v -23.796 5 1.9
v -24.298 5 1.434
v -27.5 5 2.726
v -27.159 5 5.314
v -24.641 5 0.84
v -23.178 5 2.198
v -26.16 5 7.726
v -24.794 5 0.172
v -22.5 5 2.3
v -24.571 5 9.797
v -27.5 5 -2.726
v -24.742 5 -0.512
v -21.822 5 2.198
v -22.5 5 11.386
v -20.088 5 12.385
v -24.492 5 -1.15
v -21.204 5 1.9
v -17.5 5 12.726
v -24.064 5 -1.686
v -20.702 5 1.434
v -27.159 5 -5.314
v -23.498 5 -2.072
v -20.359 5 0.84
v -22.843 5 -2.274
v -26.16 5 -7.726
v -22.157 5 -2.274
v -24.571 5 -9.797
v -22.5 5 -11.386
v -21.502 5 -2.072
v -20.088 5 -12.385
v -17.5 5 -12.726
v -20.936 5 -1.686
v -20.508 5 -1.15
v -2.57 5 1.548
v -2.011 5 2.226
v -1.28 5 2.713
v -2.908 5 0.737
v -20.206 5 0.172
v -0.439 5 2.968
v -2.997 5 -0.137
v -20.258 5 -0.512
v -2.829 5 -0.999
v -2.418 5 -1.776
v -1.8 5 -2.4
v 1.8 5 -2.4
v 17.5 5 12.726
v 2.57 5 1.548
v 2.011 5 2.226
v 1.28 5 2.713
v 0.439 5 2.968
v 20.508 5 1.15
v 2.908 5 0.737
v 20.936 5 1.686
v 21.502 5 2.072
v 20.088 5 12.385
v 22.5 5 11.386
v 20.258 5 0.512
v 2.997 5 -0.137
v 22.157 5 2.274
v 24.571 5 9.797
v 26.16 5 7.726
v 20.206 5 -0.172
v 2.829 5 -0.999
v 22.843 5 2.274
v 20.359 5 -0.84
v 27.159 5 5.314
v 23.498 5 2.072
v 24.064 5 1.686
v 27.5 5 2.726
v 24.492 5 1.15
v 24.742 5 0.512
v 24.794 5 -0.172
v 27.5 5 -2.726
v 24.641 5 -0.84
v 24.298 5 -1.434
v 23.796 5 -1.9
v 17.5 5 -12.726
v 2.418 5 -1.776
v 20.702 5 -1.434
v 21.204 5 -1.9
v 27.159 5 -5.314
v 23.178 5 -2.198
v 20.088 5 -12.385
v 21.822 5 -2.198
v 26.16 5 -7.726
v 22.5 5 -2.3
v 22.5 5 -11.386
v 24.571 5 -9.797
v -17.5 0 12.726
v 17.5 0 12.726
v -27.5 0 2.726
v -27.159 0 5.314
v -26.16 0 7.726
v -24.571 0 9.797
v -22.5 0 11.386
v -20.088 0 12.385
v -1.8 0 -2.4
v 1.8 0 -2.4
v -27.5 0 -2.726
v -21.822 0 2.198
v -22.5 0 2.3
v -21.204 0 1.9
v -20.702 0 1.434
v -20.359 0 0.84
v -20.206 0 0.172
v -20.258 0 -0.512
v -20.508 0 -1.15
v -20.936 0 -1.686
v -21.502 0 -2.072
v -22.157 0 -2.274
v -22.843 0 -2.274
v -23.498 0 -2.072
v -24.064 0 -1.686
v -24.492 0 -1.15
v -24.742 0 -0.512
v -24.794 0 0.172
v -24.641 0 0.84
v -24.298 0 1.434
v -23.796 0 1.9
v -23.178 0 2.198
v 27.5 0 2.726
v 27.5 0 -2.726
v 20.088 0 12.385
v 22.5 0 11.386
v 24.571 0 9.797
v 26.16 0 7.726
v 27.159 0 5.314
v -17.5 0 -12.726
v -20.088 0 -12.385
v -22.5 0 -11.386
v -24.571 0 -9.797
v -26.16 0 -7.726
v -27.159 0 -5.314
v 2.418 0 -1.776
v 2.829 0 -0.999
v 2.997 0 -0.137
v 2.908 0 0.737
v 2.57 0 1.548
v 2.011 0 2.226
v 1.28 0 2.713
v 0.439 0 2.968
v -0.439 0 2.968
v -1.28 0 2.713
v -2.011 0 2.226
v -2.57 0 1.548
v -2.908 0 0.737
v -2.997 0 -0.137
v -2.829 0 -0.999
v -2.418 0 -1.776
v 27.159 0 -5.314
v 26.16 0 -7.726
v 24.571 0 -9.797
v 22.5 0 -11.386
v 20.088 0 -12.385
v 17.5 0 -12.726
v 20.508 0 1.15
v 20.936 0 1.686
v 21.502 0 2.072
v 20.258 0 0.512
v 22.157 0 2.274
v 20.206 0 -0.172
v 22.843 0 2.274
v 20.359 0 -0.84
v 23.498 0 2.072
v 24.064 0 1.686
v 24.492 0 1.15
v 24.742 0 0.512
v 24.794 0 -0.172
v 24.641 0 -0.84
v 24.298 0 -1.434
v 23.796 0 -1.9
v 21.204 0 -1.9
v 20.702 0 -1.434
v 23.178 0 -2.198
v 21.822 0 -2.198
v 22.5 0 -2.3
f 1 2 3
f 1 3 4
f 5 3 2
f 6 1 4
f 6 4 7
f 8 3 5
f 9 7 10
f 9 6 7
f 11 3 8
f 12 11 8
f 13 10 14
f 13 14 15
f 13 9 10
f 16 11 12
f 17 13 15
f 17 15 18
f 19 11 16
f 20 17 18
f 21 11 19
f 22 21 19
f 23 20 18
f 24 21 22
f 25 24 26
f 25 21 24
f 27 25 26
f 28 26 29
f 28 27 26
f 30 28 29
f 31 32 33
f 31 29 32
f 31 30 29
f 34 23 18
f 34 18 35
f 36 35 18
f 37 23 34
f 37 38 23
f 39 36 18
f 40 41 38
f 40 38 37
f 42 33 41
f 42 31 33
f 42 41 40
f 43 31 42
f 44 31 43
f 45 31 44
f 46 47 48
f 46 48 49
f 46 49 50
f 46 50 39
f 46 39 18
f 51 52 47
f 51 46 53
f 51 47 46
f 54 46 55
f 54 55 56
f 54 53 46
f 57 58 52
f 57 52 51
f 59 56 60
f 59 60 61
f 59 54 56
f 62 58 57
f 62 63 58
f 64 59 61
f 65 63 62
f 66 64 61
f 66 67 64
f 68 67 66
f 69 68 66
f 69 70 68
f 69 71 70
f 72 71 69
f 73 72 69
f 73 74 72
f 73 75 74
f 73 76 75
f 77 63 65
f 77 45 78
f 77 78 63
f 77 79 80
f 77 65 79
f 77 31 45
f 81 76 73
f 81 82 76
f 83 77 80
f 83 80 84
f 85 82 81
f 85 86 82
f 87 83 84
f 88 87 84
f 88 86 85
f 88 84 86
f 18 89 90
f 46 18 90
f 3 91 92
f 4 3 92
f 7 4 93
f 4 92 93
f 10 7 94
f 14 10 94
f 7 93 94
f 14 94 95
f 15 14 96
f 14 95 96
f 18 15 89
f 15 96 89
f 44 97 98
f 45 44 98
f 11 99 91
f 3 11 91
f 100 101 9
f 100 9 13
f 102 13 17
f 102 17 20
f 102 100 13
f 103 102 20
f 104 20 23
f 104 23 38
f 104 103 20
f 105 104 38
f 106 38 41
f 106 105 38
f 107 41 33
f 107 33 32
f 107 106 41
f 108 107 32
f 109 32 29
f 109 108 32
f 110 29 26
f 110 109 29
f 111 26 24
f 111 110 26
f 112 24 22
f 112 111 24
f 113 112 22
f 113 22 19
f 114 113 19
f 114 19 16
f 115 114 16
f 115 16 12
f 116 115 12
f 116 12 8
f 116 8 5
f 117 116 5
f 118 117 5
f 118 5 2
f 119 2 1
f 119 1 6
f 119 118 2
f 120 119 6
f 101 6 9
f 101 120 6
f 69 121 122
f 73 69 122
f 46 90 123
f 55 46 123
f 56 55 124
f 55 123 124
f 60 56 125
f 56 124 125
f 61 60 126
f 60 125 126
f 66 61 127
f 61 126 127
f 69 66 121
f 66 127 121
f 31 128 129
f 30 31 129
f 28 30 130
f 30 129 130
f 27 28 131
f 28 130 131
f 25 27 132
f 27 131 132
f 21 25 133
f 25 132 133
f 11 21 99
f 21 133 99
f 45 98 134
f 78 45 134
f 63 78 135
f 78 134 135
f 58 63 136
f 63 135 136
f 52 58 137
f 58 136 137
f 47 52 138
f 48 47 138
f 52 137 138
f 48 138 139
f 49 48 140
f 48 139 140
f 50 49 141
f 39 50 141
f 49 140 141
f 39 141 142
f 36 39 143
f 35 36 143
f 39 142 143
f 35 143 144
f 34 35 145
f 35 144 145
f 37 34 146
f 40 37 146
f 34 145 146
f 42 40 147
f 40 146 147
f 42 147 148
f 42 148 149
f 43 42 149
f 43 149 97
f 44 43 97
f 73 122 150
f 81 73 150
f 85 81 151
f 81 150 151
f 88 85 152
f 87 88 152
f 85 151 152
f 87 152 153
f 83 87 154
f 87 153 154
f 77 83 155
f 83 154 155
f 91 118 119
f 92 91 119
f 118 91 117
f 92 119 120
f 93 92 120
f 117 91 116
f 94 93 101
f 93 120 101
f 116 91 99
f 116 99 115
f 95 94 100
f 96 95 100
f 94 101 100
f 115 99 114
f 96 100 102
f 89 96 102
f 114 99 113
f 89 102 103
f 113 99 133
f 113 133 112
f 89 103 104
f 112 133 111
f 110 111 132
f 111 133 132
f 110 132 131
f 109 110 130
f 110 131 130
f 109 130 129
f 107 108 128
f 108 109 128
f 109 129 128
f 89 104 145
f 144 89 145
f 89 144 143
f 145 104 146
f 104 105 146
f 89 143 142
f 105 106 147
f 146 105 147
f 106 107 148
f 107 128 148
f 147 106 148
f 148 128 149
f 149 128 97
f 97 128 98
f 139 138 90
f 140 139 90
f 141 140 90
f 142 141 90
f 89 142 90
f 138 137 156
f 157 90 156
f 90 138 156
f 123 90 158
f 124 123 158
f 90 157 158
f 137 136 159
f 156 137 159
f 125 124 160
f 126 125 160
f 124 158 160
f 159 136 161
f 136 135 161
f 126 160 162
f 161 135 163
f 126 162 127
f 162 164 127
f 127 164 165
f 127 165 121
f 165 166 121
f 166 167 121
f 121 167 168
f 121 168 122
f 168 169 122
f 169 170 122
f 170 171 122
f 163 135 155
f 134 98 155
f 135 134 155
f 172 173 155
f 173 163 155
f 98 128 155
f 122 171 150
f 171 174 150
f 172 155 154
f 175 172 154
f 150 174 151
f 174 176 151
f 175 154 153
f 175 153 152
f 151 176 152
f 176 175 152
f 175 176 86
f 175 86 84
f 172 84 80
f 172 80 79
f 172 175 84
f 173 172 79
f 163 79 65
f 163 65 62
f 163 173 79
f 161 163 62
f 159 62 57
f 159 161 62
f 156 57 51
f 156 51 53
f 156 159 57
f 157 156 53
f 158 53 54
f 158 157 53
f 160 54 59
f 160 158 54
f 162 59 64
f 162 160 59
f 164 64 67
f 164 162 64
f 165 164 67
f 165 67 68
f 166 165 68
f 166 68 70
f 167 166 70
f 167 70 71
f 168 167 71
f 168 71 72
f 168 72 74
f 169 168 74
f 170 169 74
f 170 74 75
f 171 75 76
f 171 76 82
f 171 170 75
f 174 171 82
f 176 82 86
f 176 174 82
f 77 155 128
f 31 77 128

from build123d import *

# Parameters (mm, degrees)
SZKIC1_R                    = 2.3
DODANIE_WYCI_GNI_CIE1_DEPTH = 5


with BuildPart() as part:
    # Szkic1 → Dodanie-wyciągnięcie1 (new body)
    with BuildSketch(Plane(origin=(0, 0, 0), x_dir=(1, 0, 0), z_dir=(0, 1, 0))):
        with BuildLine():
            Line((-17.5, -12.72606383), (17.5, -12.72606383))
            ThreePointArc((17.5, -12.72606383), (24.571067812, -9.797131642), (27.5, -2.72606383))
            Line((27.5, -2.72606383), (27.5, 2.72606383))
            ThreePointArc((27.5, 2.72606383), (24.571067812, 9.797131642), (17.5, 12.72606383))
            Line((17.5, 12.72606383), (-17.5, 12.72606383))
            ThreePointArc((-17.5, 12.72606383), (-24.571067812, 9.797131642), (-27.5, 2.72606383))
            Line((-27.5, 2.72606383), (-27.5, -2.72606383))
            ThreePointArc((-27.5, -2.72606383), (-24.571067812, -9.797131642), (-17.5, -12.72606383))
        make_face()
        with Locations(Location((-22.5, 0, 0), (0, 0, 270))):
            Circle(SZKIC1_R, mode=Mode.SUBTRACT)
        with Locations(Location((22.5, 0, 0), (0, 0, 90))):
            Circle(SZKIC1_R, mode=Mode.SUBTRACT)
        with BuildLine():
            Line((-1.8, 2.4), (1.8, 2.4))
            ThreePointArc((1.8, 2.4), (0, -3), (-1.8, 2.4))
        make_face(mode=Mode.SUBTRACT)
    extrude(amount=DODANIE_WYCI_GNI_CIE1_DEPTH)


solid = part.part
